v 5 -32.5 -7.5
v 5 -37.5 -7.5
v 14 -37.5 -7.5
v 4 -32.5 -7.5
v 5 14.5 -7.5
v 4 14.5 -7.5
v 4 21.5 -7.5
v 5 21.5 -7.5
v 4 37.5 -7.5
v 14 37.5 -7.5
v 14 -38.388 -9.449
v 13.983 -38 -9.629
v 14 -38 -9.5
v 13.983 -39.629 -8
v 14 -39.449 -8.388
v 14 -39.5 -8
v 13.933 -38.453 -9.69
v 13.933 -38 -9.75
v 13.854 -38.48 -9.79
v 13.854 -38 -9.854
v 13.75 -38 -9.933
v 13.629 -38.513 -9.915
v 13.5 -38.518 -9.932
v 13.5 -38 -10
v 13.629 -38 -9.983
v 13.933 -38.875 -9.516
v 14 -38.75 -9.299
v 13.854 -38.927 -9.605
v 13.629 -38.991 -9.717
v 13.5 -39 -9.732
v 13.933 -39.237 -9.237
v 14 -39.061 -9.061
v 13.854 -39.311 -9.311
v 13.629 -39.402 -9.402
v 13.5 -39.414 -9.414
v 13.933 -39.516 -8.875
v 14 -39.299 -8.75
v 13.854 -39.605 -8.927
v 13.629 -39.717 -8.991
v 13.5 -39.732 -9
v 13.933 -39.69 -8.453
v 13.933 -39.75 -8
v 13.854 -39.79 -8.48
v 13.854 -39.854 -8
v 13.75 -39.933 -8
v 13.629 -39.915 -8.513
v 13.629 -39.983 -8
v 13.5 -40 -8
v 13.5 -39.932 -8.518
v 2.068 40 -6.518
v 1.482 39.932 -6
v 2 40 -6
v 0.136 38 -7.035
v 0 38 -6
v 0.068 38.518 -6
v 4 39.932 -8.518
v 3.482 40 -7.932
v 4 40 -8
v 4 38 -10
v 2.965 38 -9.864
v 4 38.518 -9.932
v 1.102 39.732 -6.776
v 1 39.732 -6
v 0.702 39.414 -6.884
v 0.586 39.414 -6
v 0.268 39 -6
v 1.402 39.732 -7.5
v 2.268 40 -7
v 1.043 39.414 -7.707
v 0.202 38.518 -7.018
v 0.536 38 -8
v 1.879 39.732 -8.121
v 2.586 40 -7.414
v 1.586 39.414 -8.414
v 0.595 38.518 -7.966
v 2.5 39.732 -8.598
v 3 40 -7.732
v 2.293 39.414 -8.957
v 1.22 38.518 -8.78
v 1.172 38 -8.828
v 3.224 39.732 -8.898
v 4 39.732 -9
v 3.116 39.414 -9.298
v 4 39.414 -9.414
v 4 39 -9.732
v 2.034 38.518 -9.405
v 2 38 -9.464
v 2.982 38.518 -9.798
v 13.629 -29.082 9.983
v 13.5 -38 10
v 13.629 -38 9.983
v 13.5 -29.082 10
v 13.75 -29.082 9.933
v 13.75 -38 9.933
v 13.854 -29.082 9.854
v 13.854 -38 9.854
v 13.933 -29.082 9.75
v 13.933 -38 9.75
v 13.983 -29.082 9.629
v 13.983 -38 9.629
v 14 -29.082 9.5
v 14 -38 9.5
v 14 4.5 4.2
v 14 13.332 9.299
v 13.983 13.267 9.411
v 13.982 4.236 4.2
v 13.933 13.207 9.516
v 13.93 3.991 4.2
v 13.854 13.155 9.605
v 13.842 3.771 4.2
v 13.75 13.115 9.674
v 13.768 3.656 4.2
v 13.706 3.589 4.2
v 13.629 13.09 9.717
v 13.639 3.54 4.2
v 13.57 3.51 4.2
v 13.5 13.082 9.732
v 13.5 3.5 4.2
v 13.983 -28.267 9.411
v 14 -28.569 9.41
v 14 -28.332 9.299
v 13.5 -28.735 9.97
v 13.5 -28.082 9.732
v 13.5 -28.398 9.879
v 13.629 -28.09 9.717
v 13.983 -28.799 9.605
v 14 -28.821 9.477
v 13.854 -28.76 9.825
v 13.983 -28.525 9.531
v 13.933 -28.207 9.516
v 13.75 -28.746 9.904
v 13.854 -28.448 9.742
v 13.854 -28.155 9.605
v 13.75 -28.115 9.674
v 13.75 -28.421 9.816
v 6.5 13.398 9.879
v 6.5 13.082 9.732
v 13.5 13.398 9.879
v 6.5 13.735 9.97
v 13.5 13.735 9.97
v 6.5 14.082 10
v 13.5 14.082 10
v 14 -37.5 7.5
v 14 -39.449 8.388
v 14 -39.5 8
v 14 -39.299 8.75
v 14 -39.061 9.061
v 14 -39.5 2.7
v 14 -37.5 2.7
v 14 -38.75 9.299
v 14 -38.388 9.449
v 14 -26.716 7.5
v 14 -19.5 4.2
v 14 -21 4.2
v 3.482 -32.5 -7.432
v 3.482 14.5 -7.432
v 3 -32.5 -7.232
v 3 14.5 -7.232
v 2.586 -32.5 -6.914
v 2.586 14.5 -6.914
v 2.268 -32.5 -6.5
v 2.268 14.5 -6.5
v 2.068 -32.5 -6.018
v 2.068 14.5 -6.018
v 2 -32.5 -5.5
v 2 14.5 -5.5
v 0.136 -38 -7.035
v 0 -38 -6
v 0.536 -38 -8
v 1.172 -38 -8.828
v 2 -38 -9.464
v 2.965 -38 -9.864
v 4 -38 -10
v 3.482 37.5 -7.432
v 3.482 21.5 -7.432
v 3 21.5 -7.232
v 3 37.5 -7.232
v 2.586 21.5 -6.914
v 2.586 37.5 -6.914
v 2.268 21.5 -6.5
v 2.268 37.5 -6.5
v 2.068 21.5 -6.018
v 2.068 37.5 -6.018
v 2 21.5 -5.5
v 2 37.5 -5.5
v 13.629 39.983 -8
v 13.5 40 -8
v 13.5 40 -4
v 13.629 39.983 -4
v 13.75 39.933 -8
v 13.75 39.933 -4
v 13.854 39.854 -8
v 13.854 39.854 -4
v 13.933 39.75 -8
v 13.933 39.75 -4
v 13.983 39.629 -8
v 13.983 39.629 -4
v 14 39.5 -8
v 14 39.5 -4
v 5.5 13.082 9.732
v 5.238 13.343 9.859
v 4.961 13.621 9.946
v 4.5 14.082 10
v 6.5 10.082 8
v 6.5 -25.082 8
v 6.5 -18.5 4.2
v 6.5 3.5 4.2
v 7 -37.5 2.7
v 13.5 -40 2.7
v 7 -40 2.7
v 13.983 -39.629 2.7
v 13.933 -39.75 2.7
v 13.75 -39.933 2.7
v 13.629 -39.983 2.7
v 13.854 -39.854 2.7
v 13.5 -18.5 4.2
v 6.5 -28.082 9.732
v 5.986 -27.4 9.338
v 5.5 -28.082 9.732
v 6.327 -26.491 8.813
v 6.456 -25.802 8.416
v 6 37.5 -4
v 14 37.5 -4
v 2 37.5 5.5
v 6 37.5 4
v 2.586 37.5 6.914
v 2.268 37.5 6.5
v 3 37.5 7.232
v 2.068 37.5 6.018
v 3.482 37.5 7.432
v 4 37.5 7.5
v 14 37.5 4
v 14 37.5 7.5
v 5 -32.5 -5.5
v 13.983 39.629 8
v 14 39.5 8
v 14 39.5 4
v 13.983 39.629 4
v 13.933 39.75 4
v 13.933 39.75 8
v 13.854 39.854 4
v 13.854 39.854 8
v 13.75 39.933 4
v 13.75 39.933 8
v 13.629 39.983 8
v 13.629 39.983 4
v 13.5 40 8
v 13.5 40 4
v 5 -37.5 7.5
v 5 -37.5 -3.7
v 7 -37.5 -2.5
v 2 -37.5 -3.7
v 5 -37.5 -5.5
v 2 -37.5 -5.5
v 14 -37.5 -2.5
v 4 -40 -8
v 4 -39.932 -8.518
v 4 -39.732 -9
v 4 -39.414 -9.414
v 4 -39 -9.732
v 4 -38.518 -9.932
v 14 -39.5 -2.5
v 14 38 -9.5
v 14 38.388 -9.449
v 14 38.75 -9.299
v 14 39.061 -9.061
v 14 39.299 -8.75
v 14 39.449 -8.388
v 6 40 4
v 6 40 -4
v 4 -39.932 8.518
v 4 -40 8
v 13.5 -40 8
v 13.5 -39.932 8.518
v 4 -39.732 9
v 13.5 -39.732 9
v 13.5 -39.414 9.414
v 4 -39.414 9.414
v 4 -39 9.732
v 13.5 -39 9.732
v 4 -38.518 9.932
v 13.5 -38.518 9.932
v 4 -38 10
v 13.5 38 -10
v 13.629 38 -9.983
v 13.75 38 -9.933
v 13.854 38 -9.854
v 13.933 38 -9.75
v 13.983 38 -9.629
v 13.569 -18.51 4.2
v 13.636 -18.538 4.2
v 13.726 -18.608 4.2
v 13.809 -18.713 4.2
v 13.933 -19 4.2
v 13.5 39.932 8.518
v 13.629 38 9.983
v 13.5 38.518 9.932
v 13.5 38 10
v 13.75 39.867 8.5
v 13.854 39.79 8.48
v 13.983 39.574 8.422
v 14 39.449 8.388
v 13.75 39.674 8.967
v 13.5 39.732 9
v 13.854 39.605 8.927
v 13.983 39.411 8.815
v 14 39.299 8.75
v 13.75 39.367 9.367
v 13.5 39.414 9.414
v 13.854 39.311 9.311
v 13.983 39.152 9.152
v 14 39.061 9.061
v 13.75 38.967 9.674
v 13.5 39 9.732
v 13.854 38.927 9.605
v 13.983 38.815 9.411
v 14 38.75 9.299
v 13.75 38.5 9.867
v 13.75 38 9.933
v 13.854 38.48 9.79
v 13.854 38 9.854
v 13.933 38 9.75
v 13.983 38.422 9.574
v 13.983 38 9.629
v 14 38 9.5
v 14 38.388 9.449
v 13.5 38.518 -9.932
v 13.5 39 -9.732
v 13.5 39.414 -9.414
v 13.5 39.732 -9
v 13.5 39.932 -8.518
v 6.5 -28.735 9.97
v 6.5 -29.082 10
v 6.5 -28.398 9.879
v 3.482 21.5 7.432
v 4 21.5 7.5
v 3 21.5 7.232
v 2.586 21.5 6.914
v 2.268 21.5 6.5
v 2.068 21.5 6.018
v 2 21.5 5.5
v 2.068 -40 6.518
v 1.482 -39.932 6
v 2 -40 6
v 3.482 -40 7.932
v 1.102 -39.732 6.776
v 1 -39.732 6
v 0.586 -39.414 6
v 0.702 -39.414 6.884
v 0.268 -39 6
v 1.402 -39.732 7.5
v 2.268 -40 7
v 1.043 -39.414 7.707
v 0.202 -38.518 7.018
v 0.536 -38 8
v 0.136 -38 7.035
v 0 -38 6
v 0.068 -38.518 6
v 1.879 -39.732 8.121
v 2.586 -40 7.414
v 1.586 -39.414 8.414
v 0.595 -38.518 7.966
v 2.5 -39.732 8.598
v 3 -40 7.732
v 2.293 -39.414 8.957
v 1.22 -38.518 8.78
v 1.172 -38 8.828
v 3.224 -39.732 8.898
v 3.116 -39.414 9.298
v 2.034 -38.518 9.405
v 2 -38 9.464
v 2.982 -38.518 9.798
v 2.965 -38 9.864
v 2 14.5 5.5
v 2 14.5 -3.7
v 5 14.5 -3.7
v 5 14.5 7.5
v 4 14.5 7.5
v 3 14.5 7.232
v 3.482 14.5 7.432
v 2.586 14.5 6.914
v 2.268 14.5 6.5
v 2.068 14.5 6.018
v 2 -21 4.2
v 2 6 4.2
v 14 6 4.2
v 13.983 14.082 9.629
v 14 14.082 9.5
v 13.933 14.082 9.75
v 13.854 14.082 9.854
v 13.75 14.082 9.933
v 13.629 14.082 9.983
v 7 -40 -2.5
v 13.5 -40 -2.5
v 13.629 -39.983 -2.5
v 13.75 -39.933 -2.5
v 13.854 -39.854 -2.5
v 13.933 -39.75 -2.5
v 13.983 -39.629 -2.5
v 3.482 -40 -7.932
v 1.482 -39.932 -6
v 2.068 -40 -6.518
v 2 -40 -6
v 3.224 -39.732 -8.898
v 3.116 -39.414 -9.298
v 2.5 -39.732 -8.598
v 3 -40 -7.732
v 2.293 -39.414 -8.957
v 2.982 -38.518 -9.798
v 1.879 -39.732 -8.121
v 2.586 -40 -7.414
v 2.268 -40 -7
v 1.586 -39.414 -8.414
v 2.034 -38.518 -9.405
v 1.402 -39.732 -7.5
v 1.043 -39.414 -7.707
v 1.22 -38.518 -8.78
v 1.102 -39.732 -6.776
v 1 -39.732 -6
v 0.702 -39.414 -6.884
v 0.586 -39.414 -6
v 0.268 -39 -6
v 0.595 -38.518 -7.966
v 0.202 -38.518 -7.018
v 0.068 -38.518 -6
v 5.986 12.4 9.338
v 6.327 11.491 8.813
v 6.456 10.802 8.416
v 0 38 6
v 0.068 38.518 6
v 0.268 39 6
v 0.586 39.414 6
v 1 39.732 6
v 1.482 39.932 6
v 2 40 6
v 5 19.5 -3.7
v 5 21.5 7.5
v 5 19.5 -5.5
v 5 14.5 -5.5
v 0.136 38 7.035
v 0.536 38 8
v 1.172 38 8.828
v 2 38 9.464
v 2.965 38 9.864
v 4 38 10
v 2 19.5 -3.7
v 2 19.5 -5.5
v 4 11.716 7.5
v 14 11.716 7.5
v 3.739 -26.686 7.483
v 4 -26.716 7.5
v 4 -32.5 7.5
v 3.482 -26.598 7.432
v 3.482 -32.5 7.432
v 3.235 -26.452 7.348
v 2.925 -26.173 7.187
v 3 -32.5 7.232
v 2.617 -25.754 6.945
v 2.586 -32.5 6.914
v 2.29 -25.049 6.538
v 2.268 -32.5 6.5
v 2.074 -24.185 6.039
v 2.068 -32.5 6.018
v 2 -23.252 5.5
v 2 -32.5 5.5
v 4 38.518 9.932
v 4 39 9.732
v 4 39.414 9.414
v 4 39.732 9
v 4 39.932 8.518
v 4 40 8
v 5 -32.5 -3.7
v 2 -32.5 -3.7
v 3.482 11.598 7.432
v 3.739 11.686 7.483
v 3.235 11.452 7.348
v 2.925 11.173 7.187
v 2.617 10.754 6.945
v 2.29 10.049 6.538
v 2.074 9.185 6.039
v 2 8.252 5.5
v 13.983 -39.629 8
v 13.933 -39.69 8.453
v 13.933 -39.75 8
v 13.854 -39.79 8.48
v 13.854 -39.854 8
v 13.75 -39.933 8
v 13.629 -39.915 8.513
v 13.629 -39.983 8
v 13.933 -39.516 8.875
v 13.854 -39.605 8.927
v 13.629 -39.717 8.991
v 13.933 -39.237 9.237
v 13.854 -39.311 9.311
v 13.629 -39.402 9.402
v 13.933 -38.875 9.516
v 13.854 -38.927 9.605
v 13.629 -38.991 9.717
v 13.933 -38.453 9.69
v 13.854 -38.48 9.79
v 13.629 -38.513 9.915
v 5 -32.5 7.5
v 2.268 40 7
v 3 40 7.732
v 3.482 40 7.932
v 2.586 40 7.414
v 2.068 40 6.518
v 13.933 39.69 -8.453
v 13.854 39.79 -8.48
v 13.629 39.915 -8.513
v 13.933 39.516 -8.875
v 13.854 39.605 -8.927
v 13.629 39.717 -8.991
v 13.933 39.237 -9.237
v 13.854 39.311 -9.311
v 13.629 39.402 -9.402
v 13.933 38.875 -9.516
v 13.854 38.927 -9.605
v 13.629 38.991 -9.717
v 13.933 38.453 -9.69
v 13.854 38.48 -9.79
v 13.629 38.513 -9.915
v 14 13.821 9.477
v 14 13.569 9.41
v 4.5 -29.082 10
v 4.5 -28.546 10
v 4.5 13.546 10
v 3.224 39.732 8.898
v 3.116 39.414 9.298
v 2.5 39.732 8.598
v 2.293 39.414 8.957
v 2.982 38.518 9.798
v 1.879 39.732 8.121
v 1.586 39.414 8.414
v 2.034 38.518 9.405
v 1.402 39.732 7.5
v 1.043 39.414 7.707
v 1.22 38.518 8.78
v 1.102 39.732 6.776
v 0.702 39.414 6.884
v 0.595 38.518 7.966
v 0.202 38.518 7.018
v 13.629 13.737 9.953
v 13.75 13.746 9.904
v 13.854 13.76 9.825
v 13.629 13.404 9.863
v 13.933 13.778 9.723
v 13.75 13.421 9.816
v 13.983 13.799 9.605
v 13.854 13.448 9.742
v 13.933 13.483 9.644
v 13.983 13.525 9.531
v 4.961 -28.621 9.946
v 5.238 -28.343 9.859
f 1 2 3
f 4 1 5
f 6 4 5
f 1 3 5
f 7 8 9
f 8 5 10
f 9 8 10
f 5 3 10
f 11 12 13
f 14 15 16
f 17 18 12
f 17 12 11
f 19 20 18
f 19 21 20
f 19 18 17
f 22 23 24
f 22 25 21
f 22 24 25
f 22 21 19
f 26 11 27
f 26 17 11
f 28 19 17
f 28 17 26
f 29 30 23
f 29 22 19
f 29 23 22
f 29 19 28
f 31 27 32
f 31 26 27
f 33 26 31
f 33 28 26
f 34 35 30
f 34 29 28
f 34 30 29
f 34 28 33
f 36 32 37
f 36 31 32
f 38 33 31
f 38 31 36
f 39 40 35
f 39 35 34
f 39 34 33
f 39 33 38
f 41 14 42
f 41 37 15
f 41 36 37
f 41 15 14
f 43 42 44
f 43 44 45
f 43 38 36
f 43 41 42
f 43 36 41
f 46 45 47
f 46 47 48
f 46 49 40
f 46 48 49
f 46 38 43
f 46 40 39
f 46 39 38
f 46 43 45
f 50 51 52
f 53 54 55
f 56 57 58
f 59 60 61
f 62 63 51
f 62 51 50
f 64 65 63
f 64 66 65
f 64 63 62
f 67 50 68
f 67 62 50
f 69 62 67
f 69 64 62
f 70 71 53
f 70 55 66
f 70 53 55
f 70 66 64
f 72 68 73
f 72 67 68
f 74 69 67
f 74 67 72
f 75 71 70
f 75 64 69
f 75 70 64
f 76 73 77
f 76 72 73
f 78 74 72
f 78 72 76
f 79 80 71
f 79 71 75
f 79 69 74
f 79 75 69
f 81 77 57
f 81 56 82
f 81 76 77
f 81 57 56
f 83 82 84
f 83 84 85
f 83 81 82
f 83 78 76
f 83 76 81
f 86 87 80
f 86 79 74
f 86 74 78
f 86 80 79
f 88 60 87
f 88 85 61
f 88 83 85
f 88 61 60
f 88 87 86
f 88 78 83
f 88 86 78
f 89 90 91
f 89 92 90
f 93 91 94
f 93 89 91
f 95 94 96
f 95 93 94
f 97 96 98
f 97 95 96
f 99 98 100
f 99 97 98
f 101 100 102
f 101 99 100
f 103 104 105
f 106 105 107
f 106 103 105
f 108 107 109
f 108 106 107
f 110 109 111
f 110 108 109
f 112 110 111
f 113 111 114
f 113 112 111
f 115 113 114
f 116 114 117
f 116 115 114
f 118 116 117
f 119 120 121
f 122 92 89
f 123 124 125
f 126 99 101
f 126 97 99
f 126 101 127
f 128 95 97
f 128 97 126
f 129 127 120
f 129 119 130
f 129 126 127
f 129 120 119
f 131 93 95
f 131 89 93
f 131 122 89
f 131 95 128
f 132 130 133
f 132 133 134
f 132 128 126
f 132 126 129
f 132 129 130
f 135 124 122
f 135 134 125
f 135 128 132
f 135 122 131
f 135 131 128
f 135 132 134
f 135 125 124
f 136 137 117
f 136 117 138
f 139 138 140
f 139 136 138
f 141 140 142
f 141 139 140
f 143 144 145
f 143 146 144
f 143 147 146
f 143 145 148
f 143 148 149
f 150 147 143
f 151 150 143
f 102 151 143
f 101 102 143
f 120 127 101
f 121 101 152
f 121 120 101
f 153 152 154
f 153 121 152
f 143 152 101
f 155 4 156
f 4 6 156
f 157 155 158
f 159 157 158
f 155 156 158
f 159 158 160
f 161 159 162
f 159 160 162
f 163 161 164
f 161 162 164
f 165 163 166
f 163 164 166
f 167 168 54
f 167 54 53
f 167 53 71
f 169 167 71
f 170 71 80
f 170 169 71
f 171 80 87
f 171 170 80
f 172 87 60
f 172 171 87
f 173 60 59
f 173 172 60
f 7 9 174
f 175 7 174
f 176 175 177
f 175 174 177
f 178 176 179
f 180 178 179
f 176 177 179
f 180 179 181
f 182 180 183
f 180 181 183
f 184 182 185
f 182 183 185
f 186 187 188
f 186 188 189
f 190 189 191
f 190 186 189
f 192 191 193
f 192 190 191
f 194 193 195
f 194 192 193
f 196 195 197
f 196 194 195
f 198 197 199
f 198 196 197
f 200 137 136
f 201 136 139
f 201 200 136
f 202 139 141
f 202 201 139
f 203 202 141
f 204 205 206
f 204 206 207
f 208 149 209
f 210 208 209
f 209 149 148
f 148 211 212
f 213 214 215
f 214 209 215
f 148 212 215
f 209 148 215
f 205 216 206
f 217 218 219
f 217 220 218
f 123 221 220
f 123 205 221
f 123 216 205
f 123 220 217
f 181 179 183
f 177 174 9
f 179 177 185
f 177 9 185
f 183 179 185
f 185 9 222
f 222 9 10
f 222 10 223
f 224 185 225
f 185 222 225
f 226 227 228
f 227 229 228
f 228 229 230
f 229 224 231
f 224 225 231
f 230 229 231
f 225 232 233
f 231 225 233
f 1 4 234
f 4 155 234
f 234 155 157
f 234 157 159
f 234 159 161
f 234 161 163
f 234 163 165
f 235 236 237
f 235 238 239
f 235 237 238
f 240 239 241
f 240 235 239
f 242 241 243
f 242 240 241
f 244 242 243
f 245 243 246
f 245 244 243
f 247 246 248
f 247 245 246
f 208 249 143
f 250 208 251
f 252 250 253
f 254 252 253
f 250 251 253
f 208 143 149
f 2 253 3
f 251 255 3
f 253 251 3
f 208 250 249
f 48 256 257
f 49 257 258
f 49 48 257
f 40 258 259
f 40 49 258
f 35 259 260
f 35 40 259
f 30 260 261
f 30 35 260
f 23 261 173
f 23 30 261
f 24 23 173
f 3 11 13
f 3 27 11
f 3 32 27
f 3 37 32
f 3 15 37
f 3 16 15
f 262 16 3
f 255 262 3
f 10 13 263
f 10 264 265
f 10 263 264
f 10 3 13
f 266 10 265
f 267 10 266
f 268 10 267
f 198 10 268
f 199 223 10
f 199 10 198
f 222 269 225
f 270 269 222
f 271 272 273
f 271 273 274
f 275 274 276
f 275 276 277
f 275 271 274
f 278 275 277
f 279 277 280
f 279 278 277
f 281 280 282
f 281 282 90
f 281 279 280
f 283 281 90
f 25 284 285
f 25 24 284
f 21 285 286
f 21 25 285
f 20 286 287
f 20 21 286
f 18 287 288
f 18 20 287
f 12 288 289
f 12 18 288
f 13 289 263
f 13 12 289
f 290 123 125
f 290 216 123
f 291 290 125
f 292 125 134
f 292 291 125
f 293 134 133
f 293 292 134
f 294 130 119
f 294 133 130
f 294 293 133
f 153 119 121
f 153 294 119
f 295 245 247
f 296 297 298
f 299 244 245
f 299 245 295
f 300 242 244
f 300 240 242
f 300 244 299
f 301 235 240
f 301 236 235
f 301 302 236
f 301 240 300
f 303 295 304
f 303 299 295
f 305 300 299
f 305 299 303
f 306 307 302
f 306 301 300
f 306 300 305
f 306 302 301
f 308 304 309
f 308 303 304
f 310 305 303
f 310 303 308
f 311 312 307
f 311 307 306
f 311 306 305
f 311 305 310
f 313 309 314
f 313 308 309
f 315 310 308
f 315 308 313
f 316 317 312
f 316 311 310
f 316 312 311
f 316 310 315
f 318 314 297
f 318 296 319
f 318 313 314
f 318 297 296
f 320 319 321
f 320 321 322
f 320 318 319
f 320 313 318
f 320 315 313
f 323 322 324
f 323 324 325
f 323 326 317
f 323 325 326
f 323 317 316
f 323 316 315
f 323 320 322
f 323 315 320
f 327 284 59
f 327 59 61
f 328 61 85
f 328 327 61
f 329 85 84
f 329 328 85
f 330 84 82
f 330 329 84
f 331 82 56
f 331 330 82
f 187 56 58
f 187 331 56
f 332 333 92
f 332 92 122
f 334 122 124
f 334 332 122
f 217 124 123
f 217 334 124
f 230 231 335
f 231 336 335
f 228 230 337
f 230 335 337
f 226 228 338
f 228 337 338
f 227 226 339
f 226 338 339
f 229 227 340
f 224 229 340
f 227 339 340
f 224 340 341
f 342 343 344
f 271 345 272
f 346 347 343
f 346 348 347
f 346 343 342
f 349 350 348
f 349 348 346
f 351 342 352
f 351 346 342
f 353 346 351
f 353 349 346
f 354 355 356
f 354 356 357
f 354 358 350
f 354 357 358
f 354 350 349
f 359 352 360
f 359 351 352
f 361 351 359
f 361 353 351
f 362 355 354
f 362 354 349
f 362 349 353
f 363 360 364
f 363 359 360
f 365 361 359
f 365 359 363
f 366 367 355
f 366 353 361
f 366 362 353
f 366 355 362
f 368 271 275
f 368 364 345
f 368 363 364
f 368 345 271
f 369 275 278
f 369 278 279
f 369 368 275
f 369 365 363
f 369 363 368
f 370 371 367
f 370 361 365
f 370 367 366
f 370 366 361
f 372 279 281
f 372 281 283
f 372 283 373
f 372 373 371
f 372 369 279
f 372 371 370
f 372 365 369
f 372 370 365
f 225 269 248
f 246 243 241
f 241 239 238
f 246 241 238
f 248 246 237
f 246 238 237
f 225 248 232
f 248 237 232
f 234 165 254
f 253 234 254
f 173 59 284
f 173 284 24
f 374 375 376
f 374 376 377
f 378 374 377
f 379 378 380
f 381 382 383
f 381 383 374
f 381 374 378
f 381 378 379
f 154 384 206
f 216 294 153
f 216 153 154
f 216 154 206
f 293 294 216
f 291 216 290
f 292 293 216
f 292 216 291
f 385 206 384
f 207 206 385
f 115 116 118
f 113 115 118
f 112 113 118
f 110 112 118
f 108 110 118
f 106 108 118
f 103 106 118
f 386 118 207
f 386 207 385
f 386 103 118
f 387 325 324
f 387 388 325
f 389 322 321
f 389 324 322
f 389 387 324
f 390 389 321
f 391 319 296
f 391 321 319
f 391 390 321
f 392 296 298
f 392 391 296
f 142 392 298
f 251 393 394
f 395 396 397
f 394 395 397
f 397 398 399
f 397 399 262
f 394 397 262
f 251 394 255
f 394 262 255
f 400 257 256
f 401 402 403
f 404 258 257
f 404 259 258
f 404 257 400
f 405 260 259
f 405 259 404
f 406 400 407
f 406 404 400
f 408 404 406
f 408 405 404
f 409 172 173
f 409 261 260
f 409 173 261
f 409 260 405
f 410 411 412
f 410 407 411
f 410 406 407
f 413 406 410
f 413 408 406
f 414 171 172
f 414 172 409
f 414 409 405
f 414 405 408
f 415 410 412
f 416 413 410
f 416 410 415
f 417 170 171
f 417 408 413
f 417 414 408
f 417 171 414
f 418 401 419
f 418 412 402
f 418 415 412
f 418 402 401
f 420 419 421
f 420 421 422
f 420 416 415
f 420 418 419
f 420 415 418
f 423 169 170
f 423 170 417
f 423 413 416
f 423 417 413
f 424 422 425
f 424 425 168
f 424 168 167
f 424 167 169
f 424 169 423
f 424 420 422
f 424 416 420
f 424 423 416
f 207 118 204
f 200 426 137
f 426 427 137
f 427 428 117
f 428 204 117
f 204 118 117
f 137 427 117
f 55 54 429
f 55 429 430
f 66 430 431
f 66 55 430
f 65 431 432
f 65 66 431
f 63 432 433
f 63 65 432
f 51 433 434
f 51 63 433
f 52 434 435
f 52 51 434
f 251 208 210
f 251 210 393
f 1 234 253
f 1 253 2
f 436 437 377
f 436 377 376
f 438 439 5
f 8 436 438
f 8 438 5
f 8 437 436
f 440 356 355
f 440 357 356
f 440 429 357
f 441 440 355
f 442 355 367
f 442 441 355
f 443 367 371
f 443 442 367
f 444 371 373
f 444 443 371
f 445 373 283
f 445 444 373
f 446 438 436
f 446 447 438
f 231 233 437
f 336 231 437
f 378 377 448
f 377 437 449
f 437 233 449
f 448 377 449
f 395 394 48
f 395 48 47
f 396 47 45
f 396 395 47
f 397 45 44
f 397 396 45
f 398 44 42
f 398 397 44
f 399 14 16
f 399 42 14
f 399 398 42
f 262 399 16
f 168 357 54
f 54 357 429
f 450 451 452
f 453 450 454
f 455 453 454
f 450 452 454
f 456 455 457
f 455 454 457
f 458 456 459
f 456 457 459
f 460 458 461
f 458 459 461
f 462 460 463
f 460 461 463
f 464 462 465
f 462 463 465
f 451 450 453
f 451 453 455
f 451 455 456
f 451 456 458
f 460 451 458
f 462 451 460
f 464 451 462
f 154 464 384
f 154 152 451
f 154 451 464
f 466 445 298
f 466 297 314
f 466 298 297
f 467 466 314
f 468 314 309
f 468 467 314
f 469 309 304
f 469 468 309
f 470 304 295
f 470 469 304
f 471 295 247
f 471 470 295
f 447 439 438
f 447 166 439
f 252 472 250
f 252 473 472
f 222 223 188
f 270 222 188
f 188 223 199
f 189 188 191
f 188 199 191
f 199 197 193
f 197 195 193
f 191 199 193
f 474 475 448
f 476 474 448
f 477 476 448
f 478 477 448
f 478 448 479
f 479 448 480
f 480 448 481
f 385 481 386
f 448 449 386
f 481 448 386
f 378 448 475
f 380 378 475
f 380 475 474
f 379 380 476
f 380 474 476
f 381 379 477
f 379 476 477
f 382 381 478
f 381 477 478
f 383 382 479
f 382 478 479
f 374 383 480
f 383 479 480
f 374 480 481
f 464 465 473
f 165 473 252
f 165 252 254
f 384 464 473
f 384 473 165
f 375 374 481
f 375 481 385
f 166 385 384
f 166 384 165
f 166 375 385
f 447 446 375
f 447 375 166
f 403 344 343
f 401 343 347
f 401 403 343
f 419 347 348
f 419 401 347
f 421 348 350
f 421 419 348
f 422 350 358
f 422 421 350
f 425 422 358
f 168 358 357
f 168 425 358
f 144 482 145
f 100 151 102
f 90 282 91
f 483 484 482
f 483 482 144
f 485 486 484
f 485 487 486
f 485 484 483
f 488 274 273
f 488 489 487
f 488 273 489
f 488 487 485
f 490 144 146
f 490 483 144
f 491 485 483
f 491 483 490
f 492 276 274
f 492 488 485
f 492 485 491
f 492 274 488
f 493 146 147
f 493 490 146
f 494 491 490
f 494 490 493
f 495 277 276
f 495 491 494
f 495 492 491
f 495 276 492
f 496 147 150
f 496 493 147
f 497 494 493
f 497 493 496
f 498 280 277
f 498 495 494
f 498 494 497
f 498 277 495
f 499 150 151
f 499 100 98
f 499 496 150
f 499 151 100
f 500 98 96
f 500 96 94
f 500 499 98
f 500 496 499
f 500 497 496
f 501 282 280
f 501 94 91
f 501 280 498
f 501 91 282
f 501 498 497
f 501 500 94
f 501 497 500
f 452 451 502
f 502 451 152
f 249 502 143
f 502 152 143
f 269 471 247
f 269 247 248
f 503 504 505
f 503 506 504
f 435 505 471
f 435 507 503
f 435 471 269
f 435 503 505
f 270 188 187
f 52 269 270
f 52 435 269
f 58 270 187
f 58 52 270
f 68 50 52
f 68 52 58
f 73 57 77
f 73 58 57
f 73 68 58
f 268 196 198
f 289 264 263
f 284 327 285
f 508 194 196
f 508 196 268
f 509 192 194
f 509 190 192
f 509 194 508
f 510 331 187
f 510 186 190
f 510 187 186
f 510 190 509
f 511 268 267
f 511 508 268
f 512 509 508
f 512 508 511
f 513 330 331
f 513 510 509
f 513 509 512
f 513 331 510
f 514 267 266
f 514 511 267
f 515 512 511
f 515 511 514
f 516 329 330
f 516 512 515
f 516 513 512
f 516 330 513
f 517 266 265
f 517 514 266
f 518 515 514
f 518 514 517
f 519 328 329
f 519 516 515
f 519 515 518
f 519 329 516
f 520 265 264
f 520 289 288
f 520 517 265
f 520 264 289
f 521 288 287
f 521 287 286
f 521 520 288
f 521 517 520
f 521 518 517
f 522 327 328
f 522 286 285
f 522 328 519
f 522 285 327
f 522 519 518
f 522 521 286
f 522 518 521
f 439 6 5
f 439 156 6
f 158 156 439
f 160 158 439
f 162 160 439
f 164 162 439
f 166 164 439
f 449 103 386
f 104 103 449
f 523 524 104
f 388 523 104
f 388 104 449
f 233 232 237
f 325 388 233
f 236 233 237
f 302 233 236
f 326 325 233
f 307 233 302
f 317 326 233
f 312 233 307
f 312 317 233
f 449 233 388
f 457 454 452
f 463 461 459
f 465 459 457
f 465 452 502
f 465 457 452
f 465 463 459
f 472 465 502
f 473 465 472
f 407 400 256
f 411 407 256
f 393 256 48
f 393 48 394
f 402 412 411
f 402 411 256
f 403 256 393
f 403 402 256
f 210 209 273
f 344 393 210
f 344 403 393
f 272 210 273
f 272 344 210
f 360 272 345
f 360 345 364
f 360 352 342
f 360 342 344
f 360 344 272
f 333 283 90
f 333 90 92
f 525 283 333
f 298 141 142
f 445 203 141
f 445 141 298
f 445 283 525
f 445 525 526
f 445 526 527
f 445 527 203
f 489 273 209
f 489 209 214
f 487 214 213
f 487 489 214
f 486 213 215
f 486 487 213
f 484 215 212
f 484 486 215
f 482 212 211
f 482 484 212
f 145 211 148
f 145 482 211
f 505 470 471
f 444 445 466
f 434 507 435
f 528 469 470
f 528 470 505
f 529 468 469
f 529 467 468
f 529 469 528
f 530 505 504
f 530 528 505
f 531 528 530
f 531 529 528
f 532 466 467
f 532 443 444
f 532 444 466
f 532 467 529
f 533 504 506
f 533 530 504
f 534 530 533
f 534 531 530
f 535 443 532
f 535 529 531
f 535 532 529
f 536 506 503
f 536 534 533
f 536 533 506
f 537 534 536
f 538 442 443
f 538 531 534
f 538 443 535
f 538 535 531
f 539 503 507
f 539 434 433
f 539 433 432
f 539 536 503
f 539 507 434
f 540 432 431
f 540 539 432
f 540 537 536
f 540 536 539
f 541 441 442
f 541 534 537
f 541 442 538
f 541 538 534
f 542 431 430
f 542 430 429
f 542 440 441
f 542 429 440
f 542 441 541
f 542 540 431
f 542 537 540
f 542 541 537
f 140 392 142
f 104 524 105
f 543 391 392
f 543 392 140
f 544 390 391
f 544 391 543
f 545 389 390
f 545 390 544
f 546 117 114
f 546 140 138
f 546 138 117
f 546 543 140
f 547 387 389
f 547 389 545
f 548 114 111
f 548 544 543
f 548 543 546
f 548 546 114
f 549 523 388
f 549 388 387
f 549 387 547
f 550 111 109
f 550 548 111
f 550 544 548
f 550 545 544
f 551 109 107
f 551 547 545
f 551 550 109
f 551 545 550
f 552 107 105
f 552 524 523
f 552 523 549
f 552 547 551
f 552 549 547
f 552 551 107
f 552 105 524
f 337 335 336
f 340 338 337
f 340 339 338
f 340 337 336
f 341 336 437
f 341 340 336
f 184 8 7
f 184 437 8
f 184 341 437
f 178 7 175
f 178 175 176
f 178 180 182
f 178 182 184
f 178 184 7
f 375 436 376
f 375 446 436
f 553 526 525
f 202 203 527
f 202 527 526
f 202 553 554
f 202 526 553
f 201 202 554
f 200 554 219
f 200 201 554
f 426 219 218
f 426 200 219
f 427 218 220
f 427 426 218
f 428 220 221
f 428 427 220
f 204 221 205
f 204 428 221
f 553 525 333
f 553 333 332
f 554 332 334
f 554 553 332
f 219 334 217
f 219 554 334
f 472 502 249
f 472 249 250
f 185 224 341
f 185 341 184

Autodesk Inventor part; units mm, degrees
ref_plane "YZ Plane" through (0, 0, 0) normal (1, 0, 0) x (0, 1, 0)
ref_plane "XZ Plane" through (0, 0, 0) normal (0, 1, 0) x (-1, 0, 0)
ref_plane "XY Plane" through (0, 0, 0) normal (0, 0, 1) x (1, 0, 0)
sketch "Skizze1" plane through (0, 0, 0) normal (1, 0, 0) x (0, 1, 0)
  line L0 (40, -10) -> (-40, -10)
  line L1 (-40, -10) -> (-40, 10)
  line L2 (-40, 10) -> (40, 10)
  line L3 (40, 10) -> (40, -10)
  line L4 (40, -10) -> (-40, 10) construction
  line L5 (-40, -10) -> (40, 10) construction
  point P0 (0, 0)
  dimension "d0" = 80
  dimension "d1" = 20
extrude "Extrusion1" add sketch "Skizze1" along normal blind 14
sketch "Skizze2" plane through (14, 0, 0) normal (1, 0, 0) x (0, 0, -1)
  line L0 (7.5, 37.5) -> (-7.5, 37.5)
  line L1 (-7.5, 37.5) -> (-7.5, -37.5)
  line L2 (-7.5, -37.5) -> (7.5, -37.5)
  line L3 (7.5, -37.5) -> (7.5, 37.5)
  line L4 (7.5, 37.5) -> (-7.5, -37.5) construction
  line L5 (-7.5, 37.5) -> (7.5, -37.5) construction
  line L6 (10, 40) -> (-10, 40) projected
  point P0 (0, 0)
  dimension "d4" = 15
  dimension "d5" = 2.5
extrude "Extrusion2" cut sketch "Skizze2" against normal blind 12
sketch "Skizze3" plane through (14, 0, 0) normal (1, 0, 0) x (0, 0, -1)
  line L0 (-2.7, -40) -> (2.5, -40)
  line L1 (2.5, -40) -> (2.5, -37.5)
  line L2 (2.5, -37.5) -> (-2.7, -37.5)
  line L3 (-2.7, -37.5) -> (-2.7, -40)
  line L4 (7.5, -37.5) -> (-7.5, -37.5) projected
  line L5 (-10, -40) -> (10, -40) projected
  line L6 (7.5, 37.5) -> (7.5, -37.5) projected
  point P0 (0, 0)
  dimension "d8" = 5.2
  dimension "d9" = 5
extrude "Extrusion3" cut sketch "Skizze3" against normal blind 7
sketch "Skizze4" plane through (2, 0, 0) normal (1, 0, 0) x (0, 0, -1)
  line L0 (5.5, -37.5) -> (7.5, -37.5)
  line L1 (7.5, -37.5) -> (7.5, -32.5)
  line L2 (7.5, -32.5) -> (5.5, -32.5)
  line L3 (5.5, -32.5) -> (5.5, -37.5)
  line L4 (7.5, -37.5) -> (-7.5, -37.5) projected
  line L5 (7.5, 37.5) -> (7.5, -37.5) projected
  line L6 (3.7, -37.5) -> (-7.5, -37.5)
  line L7 (-7.5, -37.5) -> (-7.5, -32.5)
  line L8 (-7.5, -32.5) -> (3.7, -32.5)
  line L9 (3.7, -32.5) -> (3.7, -37.5)
  line L10 (-7.5, -37.5) -> (-7.5, 37.5) projected
  line L11 (7.5, 14.5) -> (5.5, 14.5)
  line L12 (5.5, 14.5) -> (5.5, 19.5)
  line L13 (5.5, 19.5) -> (7.5, 19.5)
  line L14 (7.5, 19.5) -> (7.5, 14.5)
  line L15 (3.7, 14.5) -> (-7.5, 14.5)
  line L16 (-7.5, 14.5) -> (-7.5, 19.5)
  line L17 (-7.5, 19.5) -> (3.7, 19.5)
  line L18 (3.7, 19.5) -> (3.7, 14.5)
  line L19 (7.5, 19.5) -> (-7.5, 19.5)
  line L20 (-7.5, 19.5) -> (-7.5, 21.5)
  line L21 (-7.5, 21.5) -> (7.5, 21.5)
  line L22 (7.5, 21.5) -> (7.5, 19.5)
  point P0 (0, 0)
  dimension "d12" = 5
  dimension "d13" = 2
  dimension "d14" = 1.8
  dimension "d15" = 57
  dimension "d24" = 2
extrude "Extrusion4" add sketch "Skizze4" along normal blind 3 contours L3 L2 L1 L0 | L4 L7 L8 L9 | L11 L12 L13 L5 | L13 L19 L17 L10 L21 L5 | L10 L17 L18 L15
fillet "Rundung1" radius 2 4 edges at (2, -9, 7.5) (2, -9, -7.5) (2, 29.5, 7.5) (2, 29.5, -7.5)
fillet "Rundung2" radius 4 2 edges at (0, 0, 10) (0, 0, -10)
sketch "Skizze5" plane through (14, 0, 0) normal (1, 0, 0) x (0, 0, -1)
  line L0 (-4, 37.5) -> (4, 37.5)
  line L1 (4, 37.5) -> (4, 40)
  line L2 (4, 40) -> (-4, 40)
  line L3 (-4, 40) -> (-4, 37.5)
  line L4 (-7.5, 37.5) -> (7.5, 37.5) projected
  line L5 (10, 40) -> (-10, 40) projected
  line L6 (-6, 40) -> (6, 40) projected
  point P0 (0, 0)
  point P1 (0, 40)
  point P2 (0, 40)
  dimension "d20" = 8
extrude "Extrusion5" cut sketch "Skizze5" against normal blind 8
fillet "Rundung3" radius 2 10 edges at (0, 40, 0) (1.1716, 40, -8.8284) (9, 40, -10) (1.1716, 40, 8.8284) (9, 40, 10) (1.1716, -40, 8.8284) (9, -40, 10) (1.1716, -40, -8.8284) (9, -40, -10) (0, -40, 0)
sketch "Skizze6" plane through (14, 0, 0) normal (1, 0, 0) x (0, 0, -1)
  line L0 (-7.5, -37.5) -> (-7.5, 37.5) projected
  line L1 (-7.5, -26.7158) -> (-7.5, 11.7158)
  line L2 (-7.5, 11.7158) -> (-4.2, 6)
  line L3 (-7.5, -26.7158) -> (-4.2, -21)
  line L4 (-4.2, -21) -> (-4.2, 6)
  line L5 (-7.5, -7.5) -> (-4.2, -7.5) construction
  line L6 (-2.7, -40) -> (-2.7, -37.5) construction
  line L7 (-8, -40) -> (-2.7, -40) construction
  point P0 (0, 0)
  dimension "d25" = 27
  dimension "d26" = 30
  dimension "d27" = 1.5
  dimension "d28" = 19
extrude "Extrusion6" add sketch "Skizze6" against normal up to next
sketch "Skizze7" plane through (14, 0, 0) normal (1, 0, 0) x (0, 0, -1)
  line L0 (-4.2, 6) -> (-4.2, -21) projected
  line L1 (-4.2, -18.5) -> (-10, -28.5459)
  line L2 (-10, -38) -> (-10, 38) projected
  line L3 (-4.2, 3.5) -> (-10, 13.5459)
  line L4 (-10, 13.5459) -> (-10, -28.5459)
  line L5 (-4.2, 3.5) -> (-4.2, -18.5)
  line L6 (-10, -7.5) -> (-4.2, -7.5) construction
  line L7 (-4.2, -21) -> (-7.5, -26.7158) projected
  point P0 (0, 0)
  dimension "d31" = 22
extrude "Extrusion7" cut sketch "Skizze7" against normal blind 7.5
fillet "Rundung4" radius 2 1 edges at (6.5, -7.5, 10)
fillet "Rundung6" radius 2 4 edges at (5.5, -28.5459, 10) (10.25, -28.5459, 10) (5.5, 13.5459, 10) (10.25, 13.5459, 10)
fillet "Rundung5" radius 0.5 11 edges at (14, -39.4142, 9.4142) (14, -40, 5.35) (14, -33.5409, 10) (14, 39.4142, 9.4142) (14, 40, 6) (14, 26.0409, 10) (14, 39.4142, -9.4142) (14, 40, -6) (14, -39.4142, -9.4142) (14, -40, -5.25) (14, 0, -10)
equation "\"G_L\" = 0"
equation "\"G_H\" = 0"
equation "\"G_B\" = 0"
properties part number "5V_Supply" material "GEDA Stahl"
